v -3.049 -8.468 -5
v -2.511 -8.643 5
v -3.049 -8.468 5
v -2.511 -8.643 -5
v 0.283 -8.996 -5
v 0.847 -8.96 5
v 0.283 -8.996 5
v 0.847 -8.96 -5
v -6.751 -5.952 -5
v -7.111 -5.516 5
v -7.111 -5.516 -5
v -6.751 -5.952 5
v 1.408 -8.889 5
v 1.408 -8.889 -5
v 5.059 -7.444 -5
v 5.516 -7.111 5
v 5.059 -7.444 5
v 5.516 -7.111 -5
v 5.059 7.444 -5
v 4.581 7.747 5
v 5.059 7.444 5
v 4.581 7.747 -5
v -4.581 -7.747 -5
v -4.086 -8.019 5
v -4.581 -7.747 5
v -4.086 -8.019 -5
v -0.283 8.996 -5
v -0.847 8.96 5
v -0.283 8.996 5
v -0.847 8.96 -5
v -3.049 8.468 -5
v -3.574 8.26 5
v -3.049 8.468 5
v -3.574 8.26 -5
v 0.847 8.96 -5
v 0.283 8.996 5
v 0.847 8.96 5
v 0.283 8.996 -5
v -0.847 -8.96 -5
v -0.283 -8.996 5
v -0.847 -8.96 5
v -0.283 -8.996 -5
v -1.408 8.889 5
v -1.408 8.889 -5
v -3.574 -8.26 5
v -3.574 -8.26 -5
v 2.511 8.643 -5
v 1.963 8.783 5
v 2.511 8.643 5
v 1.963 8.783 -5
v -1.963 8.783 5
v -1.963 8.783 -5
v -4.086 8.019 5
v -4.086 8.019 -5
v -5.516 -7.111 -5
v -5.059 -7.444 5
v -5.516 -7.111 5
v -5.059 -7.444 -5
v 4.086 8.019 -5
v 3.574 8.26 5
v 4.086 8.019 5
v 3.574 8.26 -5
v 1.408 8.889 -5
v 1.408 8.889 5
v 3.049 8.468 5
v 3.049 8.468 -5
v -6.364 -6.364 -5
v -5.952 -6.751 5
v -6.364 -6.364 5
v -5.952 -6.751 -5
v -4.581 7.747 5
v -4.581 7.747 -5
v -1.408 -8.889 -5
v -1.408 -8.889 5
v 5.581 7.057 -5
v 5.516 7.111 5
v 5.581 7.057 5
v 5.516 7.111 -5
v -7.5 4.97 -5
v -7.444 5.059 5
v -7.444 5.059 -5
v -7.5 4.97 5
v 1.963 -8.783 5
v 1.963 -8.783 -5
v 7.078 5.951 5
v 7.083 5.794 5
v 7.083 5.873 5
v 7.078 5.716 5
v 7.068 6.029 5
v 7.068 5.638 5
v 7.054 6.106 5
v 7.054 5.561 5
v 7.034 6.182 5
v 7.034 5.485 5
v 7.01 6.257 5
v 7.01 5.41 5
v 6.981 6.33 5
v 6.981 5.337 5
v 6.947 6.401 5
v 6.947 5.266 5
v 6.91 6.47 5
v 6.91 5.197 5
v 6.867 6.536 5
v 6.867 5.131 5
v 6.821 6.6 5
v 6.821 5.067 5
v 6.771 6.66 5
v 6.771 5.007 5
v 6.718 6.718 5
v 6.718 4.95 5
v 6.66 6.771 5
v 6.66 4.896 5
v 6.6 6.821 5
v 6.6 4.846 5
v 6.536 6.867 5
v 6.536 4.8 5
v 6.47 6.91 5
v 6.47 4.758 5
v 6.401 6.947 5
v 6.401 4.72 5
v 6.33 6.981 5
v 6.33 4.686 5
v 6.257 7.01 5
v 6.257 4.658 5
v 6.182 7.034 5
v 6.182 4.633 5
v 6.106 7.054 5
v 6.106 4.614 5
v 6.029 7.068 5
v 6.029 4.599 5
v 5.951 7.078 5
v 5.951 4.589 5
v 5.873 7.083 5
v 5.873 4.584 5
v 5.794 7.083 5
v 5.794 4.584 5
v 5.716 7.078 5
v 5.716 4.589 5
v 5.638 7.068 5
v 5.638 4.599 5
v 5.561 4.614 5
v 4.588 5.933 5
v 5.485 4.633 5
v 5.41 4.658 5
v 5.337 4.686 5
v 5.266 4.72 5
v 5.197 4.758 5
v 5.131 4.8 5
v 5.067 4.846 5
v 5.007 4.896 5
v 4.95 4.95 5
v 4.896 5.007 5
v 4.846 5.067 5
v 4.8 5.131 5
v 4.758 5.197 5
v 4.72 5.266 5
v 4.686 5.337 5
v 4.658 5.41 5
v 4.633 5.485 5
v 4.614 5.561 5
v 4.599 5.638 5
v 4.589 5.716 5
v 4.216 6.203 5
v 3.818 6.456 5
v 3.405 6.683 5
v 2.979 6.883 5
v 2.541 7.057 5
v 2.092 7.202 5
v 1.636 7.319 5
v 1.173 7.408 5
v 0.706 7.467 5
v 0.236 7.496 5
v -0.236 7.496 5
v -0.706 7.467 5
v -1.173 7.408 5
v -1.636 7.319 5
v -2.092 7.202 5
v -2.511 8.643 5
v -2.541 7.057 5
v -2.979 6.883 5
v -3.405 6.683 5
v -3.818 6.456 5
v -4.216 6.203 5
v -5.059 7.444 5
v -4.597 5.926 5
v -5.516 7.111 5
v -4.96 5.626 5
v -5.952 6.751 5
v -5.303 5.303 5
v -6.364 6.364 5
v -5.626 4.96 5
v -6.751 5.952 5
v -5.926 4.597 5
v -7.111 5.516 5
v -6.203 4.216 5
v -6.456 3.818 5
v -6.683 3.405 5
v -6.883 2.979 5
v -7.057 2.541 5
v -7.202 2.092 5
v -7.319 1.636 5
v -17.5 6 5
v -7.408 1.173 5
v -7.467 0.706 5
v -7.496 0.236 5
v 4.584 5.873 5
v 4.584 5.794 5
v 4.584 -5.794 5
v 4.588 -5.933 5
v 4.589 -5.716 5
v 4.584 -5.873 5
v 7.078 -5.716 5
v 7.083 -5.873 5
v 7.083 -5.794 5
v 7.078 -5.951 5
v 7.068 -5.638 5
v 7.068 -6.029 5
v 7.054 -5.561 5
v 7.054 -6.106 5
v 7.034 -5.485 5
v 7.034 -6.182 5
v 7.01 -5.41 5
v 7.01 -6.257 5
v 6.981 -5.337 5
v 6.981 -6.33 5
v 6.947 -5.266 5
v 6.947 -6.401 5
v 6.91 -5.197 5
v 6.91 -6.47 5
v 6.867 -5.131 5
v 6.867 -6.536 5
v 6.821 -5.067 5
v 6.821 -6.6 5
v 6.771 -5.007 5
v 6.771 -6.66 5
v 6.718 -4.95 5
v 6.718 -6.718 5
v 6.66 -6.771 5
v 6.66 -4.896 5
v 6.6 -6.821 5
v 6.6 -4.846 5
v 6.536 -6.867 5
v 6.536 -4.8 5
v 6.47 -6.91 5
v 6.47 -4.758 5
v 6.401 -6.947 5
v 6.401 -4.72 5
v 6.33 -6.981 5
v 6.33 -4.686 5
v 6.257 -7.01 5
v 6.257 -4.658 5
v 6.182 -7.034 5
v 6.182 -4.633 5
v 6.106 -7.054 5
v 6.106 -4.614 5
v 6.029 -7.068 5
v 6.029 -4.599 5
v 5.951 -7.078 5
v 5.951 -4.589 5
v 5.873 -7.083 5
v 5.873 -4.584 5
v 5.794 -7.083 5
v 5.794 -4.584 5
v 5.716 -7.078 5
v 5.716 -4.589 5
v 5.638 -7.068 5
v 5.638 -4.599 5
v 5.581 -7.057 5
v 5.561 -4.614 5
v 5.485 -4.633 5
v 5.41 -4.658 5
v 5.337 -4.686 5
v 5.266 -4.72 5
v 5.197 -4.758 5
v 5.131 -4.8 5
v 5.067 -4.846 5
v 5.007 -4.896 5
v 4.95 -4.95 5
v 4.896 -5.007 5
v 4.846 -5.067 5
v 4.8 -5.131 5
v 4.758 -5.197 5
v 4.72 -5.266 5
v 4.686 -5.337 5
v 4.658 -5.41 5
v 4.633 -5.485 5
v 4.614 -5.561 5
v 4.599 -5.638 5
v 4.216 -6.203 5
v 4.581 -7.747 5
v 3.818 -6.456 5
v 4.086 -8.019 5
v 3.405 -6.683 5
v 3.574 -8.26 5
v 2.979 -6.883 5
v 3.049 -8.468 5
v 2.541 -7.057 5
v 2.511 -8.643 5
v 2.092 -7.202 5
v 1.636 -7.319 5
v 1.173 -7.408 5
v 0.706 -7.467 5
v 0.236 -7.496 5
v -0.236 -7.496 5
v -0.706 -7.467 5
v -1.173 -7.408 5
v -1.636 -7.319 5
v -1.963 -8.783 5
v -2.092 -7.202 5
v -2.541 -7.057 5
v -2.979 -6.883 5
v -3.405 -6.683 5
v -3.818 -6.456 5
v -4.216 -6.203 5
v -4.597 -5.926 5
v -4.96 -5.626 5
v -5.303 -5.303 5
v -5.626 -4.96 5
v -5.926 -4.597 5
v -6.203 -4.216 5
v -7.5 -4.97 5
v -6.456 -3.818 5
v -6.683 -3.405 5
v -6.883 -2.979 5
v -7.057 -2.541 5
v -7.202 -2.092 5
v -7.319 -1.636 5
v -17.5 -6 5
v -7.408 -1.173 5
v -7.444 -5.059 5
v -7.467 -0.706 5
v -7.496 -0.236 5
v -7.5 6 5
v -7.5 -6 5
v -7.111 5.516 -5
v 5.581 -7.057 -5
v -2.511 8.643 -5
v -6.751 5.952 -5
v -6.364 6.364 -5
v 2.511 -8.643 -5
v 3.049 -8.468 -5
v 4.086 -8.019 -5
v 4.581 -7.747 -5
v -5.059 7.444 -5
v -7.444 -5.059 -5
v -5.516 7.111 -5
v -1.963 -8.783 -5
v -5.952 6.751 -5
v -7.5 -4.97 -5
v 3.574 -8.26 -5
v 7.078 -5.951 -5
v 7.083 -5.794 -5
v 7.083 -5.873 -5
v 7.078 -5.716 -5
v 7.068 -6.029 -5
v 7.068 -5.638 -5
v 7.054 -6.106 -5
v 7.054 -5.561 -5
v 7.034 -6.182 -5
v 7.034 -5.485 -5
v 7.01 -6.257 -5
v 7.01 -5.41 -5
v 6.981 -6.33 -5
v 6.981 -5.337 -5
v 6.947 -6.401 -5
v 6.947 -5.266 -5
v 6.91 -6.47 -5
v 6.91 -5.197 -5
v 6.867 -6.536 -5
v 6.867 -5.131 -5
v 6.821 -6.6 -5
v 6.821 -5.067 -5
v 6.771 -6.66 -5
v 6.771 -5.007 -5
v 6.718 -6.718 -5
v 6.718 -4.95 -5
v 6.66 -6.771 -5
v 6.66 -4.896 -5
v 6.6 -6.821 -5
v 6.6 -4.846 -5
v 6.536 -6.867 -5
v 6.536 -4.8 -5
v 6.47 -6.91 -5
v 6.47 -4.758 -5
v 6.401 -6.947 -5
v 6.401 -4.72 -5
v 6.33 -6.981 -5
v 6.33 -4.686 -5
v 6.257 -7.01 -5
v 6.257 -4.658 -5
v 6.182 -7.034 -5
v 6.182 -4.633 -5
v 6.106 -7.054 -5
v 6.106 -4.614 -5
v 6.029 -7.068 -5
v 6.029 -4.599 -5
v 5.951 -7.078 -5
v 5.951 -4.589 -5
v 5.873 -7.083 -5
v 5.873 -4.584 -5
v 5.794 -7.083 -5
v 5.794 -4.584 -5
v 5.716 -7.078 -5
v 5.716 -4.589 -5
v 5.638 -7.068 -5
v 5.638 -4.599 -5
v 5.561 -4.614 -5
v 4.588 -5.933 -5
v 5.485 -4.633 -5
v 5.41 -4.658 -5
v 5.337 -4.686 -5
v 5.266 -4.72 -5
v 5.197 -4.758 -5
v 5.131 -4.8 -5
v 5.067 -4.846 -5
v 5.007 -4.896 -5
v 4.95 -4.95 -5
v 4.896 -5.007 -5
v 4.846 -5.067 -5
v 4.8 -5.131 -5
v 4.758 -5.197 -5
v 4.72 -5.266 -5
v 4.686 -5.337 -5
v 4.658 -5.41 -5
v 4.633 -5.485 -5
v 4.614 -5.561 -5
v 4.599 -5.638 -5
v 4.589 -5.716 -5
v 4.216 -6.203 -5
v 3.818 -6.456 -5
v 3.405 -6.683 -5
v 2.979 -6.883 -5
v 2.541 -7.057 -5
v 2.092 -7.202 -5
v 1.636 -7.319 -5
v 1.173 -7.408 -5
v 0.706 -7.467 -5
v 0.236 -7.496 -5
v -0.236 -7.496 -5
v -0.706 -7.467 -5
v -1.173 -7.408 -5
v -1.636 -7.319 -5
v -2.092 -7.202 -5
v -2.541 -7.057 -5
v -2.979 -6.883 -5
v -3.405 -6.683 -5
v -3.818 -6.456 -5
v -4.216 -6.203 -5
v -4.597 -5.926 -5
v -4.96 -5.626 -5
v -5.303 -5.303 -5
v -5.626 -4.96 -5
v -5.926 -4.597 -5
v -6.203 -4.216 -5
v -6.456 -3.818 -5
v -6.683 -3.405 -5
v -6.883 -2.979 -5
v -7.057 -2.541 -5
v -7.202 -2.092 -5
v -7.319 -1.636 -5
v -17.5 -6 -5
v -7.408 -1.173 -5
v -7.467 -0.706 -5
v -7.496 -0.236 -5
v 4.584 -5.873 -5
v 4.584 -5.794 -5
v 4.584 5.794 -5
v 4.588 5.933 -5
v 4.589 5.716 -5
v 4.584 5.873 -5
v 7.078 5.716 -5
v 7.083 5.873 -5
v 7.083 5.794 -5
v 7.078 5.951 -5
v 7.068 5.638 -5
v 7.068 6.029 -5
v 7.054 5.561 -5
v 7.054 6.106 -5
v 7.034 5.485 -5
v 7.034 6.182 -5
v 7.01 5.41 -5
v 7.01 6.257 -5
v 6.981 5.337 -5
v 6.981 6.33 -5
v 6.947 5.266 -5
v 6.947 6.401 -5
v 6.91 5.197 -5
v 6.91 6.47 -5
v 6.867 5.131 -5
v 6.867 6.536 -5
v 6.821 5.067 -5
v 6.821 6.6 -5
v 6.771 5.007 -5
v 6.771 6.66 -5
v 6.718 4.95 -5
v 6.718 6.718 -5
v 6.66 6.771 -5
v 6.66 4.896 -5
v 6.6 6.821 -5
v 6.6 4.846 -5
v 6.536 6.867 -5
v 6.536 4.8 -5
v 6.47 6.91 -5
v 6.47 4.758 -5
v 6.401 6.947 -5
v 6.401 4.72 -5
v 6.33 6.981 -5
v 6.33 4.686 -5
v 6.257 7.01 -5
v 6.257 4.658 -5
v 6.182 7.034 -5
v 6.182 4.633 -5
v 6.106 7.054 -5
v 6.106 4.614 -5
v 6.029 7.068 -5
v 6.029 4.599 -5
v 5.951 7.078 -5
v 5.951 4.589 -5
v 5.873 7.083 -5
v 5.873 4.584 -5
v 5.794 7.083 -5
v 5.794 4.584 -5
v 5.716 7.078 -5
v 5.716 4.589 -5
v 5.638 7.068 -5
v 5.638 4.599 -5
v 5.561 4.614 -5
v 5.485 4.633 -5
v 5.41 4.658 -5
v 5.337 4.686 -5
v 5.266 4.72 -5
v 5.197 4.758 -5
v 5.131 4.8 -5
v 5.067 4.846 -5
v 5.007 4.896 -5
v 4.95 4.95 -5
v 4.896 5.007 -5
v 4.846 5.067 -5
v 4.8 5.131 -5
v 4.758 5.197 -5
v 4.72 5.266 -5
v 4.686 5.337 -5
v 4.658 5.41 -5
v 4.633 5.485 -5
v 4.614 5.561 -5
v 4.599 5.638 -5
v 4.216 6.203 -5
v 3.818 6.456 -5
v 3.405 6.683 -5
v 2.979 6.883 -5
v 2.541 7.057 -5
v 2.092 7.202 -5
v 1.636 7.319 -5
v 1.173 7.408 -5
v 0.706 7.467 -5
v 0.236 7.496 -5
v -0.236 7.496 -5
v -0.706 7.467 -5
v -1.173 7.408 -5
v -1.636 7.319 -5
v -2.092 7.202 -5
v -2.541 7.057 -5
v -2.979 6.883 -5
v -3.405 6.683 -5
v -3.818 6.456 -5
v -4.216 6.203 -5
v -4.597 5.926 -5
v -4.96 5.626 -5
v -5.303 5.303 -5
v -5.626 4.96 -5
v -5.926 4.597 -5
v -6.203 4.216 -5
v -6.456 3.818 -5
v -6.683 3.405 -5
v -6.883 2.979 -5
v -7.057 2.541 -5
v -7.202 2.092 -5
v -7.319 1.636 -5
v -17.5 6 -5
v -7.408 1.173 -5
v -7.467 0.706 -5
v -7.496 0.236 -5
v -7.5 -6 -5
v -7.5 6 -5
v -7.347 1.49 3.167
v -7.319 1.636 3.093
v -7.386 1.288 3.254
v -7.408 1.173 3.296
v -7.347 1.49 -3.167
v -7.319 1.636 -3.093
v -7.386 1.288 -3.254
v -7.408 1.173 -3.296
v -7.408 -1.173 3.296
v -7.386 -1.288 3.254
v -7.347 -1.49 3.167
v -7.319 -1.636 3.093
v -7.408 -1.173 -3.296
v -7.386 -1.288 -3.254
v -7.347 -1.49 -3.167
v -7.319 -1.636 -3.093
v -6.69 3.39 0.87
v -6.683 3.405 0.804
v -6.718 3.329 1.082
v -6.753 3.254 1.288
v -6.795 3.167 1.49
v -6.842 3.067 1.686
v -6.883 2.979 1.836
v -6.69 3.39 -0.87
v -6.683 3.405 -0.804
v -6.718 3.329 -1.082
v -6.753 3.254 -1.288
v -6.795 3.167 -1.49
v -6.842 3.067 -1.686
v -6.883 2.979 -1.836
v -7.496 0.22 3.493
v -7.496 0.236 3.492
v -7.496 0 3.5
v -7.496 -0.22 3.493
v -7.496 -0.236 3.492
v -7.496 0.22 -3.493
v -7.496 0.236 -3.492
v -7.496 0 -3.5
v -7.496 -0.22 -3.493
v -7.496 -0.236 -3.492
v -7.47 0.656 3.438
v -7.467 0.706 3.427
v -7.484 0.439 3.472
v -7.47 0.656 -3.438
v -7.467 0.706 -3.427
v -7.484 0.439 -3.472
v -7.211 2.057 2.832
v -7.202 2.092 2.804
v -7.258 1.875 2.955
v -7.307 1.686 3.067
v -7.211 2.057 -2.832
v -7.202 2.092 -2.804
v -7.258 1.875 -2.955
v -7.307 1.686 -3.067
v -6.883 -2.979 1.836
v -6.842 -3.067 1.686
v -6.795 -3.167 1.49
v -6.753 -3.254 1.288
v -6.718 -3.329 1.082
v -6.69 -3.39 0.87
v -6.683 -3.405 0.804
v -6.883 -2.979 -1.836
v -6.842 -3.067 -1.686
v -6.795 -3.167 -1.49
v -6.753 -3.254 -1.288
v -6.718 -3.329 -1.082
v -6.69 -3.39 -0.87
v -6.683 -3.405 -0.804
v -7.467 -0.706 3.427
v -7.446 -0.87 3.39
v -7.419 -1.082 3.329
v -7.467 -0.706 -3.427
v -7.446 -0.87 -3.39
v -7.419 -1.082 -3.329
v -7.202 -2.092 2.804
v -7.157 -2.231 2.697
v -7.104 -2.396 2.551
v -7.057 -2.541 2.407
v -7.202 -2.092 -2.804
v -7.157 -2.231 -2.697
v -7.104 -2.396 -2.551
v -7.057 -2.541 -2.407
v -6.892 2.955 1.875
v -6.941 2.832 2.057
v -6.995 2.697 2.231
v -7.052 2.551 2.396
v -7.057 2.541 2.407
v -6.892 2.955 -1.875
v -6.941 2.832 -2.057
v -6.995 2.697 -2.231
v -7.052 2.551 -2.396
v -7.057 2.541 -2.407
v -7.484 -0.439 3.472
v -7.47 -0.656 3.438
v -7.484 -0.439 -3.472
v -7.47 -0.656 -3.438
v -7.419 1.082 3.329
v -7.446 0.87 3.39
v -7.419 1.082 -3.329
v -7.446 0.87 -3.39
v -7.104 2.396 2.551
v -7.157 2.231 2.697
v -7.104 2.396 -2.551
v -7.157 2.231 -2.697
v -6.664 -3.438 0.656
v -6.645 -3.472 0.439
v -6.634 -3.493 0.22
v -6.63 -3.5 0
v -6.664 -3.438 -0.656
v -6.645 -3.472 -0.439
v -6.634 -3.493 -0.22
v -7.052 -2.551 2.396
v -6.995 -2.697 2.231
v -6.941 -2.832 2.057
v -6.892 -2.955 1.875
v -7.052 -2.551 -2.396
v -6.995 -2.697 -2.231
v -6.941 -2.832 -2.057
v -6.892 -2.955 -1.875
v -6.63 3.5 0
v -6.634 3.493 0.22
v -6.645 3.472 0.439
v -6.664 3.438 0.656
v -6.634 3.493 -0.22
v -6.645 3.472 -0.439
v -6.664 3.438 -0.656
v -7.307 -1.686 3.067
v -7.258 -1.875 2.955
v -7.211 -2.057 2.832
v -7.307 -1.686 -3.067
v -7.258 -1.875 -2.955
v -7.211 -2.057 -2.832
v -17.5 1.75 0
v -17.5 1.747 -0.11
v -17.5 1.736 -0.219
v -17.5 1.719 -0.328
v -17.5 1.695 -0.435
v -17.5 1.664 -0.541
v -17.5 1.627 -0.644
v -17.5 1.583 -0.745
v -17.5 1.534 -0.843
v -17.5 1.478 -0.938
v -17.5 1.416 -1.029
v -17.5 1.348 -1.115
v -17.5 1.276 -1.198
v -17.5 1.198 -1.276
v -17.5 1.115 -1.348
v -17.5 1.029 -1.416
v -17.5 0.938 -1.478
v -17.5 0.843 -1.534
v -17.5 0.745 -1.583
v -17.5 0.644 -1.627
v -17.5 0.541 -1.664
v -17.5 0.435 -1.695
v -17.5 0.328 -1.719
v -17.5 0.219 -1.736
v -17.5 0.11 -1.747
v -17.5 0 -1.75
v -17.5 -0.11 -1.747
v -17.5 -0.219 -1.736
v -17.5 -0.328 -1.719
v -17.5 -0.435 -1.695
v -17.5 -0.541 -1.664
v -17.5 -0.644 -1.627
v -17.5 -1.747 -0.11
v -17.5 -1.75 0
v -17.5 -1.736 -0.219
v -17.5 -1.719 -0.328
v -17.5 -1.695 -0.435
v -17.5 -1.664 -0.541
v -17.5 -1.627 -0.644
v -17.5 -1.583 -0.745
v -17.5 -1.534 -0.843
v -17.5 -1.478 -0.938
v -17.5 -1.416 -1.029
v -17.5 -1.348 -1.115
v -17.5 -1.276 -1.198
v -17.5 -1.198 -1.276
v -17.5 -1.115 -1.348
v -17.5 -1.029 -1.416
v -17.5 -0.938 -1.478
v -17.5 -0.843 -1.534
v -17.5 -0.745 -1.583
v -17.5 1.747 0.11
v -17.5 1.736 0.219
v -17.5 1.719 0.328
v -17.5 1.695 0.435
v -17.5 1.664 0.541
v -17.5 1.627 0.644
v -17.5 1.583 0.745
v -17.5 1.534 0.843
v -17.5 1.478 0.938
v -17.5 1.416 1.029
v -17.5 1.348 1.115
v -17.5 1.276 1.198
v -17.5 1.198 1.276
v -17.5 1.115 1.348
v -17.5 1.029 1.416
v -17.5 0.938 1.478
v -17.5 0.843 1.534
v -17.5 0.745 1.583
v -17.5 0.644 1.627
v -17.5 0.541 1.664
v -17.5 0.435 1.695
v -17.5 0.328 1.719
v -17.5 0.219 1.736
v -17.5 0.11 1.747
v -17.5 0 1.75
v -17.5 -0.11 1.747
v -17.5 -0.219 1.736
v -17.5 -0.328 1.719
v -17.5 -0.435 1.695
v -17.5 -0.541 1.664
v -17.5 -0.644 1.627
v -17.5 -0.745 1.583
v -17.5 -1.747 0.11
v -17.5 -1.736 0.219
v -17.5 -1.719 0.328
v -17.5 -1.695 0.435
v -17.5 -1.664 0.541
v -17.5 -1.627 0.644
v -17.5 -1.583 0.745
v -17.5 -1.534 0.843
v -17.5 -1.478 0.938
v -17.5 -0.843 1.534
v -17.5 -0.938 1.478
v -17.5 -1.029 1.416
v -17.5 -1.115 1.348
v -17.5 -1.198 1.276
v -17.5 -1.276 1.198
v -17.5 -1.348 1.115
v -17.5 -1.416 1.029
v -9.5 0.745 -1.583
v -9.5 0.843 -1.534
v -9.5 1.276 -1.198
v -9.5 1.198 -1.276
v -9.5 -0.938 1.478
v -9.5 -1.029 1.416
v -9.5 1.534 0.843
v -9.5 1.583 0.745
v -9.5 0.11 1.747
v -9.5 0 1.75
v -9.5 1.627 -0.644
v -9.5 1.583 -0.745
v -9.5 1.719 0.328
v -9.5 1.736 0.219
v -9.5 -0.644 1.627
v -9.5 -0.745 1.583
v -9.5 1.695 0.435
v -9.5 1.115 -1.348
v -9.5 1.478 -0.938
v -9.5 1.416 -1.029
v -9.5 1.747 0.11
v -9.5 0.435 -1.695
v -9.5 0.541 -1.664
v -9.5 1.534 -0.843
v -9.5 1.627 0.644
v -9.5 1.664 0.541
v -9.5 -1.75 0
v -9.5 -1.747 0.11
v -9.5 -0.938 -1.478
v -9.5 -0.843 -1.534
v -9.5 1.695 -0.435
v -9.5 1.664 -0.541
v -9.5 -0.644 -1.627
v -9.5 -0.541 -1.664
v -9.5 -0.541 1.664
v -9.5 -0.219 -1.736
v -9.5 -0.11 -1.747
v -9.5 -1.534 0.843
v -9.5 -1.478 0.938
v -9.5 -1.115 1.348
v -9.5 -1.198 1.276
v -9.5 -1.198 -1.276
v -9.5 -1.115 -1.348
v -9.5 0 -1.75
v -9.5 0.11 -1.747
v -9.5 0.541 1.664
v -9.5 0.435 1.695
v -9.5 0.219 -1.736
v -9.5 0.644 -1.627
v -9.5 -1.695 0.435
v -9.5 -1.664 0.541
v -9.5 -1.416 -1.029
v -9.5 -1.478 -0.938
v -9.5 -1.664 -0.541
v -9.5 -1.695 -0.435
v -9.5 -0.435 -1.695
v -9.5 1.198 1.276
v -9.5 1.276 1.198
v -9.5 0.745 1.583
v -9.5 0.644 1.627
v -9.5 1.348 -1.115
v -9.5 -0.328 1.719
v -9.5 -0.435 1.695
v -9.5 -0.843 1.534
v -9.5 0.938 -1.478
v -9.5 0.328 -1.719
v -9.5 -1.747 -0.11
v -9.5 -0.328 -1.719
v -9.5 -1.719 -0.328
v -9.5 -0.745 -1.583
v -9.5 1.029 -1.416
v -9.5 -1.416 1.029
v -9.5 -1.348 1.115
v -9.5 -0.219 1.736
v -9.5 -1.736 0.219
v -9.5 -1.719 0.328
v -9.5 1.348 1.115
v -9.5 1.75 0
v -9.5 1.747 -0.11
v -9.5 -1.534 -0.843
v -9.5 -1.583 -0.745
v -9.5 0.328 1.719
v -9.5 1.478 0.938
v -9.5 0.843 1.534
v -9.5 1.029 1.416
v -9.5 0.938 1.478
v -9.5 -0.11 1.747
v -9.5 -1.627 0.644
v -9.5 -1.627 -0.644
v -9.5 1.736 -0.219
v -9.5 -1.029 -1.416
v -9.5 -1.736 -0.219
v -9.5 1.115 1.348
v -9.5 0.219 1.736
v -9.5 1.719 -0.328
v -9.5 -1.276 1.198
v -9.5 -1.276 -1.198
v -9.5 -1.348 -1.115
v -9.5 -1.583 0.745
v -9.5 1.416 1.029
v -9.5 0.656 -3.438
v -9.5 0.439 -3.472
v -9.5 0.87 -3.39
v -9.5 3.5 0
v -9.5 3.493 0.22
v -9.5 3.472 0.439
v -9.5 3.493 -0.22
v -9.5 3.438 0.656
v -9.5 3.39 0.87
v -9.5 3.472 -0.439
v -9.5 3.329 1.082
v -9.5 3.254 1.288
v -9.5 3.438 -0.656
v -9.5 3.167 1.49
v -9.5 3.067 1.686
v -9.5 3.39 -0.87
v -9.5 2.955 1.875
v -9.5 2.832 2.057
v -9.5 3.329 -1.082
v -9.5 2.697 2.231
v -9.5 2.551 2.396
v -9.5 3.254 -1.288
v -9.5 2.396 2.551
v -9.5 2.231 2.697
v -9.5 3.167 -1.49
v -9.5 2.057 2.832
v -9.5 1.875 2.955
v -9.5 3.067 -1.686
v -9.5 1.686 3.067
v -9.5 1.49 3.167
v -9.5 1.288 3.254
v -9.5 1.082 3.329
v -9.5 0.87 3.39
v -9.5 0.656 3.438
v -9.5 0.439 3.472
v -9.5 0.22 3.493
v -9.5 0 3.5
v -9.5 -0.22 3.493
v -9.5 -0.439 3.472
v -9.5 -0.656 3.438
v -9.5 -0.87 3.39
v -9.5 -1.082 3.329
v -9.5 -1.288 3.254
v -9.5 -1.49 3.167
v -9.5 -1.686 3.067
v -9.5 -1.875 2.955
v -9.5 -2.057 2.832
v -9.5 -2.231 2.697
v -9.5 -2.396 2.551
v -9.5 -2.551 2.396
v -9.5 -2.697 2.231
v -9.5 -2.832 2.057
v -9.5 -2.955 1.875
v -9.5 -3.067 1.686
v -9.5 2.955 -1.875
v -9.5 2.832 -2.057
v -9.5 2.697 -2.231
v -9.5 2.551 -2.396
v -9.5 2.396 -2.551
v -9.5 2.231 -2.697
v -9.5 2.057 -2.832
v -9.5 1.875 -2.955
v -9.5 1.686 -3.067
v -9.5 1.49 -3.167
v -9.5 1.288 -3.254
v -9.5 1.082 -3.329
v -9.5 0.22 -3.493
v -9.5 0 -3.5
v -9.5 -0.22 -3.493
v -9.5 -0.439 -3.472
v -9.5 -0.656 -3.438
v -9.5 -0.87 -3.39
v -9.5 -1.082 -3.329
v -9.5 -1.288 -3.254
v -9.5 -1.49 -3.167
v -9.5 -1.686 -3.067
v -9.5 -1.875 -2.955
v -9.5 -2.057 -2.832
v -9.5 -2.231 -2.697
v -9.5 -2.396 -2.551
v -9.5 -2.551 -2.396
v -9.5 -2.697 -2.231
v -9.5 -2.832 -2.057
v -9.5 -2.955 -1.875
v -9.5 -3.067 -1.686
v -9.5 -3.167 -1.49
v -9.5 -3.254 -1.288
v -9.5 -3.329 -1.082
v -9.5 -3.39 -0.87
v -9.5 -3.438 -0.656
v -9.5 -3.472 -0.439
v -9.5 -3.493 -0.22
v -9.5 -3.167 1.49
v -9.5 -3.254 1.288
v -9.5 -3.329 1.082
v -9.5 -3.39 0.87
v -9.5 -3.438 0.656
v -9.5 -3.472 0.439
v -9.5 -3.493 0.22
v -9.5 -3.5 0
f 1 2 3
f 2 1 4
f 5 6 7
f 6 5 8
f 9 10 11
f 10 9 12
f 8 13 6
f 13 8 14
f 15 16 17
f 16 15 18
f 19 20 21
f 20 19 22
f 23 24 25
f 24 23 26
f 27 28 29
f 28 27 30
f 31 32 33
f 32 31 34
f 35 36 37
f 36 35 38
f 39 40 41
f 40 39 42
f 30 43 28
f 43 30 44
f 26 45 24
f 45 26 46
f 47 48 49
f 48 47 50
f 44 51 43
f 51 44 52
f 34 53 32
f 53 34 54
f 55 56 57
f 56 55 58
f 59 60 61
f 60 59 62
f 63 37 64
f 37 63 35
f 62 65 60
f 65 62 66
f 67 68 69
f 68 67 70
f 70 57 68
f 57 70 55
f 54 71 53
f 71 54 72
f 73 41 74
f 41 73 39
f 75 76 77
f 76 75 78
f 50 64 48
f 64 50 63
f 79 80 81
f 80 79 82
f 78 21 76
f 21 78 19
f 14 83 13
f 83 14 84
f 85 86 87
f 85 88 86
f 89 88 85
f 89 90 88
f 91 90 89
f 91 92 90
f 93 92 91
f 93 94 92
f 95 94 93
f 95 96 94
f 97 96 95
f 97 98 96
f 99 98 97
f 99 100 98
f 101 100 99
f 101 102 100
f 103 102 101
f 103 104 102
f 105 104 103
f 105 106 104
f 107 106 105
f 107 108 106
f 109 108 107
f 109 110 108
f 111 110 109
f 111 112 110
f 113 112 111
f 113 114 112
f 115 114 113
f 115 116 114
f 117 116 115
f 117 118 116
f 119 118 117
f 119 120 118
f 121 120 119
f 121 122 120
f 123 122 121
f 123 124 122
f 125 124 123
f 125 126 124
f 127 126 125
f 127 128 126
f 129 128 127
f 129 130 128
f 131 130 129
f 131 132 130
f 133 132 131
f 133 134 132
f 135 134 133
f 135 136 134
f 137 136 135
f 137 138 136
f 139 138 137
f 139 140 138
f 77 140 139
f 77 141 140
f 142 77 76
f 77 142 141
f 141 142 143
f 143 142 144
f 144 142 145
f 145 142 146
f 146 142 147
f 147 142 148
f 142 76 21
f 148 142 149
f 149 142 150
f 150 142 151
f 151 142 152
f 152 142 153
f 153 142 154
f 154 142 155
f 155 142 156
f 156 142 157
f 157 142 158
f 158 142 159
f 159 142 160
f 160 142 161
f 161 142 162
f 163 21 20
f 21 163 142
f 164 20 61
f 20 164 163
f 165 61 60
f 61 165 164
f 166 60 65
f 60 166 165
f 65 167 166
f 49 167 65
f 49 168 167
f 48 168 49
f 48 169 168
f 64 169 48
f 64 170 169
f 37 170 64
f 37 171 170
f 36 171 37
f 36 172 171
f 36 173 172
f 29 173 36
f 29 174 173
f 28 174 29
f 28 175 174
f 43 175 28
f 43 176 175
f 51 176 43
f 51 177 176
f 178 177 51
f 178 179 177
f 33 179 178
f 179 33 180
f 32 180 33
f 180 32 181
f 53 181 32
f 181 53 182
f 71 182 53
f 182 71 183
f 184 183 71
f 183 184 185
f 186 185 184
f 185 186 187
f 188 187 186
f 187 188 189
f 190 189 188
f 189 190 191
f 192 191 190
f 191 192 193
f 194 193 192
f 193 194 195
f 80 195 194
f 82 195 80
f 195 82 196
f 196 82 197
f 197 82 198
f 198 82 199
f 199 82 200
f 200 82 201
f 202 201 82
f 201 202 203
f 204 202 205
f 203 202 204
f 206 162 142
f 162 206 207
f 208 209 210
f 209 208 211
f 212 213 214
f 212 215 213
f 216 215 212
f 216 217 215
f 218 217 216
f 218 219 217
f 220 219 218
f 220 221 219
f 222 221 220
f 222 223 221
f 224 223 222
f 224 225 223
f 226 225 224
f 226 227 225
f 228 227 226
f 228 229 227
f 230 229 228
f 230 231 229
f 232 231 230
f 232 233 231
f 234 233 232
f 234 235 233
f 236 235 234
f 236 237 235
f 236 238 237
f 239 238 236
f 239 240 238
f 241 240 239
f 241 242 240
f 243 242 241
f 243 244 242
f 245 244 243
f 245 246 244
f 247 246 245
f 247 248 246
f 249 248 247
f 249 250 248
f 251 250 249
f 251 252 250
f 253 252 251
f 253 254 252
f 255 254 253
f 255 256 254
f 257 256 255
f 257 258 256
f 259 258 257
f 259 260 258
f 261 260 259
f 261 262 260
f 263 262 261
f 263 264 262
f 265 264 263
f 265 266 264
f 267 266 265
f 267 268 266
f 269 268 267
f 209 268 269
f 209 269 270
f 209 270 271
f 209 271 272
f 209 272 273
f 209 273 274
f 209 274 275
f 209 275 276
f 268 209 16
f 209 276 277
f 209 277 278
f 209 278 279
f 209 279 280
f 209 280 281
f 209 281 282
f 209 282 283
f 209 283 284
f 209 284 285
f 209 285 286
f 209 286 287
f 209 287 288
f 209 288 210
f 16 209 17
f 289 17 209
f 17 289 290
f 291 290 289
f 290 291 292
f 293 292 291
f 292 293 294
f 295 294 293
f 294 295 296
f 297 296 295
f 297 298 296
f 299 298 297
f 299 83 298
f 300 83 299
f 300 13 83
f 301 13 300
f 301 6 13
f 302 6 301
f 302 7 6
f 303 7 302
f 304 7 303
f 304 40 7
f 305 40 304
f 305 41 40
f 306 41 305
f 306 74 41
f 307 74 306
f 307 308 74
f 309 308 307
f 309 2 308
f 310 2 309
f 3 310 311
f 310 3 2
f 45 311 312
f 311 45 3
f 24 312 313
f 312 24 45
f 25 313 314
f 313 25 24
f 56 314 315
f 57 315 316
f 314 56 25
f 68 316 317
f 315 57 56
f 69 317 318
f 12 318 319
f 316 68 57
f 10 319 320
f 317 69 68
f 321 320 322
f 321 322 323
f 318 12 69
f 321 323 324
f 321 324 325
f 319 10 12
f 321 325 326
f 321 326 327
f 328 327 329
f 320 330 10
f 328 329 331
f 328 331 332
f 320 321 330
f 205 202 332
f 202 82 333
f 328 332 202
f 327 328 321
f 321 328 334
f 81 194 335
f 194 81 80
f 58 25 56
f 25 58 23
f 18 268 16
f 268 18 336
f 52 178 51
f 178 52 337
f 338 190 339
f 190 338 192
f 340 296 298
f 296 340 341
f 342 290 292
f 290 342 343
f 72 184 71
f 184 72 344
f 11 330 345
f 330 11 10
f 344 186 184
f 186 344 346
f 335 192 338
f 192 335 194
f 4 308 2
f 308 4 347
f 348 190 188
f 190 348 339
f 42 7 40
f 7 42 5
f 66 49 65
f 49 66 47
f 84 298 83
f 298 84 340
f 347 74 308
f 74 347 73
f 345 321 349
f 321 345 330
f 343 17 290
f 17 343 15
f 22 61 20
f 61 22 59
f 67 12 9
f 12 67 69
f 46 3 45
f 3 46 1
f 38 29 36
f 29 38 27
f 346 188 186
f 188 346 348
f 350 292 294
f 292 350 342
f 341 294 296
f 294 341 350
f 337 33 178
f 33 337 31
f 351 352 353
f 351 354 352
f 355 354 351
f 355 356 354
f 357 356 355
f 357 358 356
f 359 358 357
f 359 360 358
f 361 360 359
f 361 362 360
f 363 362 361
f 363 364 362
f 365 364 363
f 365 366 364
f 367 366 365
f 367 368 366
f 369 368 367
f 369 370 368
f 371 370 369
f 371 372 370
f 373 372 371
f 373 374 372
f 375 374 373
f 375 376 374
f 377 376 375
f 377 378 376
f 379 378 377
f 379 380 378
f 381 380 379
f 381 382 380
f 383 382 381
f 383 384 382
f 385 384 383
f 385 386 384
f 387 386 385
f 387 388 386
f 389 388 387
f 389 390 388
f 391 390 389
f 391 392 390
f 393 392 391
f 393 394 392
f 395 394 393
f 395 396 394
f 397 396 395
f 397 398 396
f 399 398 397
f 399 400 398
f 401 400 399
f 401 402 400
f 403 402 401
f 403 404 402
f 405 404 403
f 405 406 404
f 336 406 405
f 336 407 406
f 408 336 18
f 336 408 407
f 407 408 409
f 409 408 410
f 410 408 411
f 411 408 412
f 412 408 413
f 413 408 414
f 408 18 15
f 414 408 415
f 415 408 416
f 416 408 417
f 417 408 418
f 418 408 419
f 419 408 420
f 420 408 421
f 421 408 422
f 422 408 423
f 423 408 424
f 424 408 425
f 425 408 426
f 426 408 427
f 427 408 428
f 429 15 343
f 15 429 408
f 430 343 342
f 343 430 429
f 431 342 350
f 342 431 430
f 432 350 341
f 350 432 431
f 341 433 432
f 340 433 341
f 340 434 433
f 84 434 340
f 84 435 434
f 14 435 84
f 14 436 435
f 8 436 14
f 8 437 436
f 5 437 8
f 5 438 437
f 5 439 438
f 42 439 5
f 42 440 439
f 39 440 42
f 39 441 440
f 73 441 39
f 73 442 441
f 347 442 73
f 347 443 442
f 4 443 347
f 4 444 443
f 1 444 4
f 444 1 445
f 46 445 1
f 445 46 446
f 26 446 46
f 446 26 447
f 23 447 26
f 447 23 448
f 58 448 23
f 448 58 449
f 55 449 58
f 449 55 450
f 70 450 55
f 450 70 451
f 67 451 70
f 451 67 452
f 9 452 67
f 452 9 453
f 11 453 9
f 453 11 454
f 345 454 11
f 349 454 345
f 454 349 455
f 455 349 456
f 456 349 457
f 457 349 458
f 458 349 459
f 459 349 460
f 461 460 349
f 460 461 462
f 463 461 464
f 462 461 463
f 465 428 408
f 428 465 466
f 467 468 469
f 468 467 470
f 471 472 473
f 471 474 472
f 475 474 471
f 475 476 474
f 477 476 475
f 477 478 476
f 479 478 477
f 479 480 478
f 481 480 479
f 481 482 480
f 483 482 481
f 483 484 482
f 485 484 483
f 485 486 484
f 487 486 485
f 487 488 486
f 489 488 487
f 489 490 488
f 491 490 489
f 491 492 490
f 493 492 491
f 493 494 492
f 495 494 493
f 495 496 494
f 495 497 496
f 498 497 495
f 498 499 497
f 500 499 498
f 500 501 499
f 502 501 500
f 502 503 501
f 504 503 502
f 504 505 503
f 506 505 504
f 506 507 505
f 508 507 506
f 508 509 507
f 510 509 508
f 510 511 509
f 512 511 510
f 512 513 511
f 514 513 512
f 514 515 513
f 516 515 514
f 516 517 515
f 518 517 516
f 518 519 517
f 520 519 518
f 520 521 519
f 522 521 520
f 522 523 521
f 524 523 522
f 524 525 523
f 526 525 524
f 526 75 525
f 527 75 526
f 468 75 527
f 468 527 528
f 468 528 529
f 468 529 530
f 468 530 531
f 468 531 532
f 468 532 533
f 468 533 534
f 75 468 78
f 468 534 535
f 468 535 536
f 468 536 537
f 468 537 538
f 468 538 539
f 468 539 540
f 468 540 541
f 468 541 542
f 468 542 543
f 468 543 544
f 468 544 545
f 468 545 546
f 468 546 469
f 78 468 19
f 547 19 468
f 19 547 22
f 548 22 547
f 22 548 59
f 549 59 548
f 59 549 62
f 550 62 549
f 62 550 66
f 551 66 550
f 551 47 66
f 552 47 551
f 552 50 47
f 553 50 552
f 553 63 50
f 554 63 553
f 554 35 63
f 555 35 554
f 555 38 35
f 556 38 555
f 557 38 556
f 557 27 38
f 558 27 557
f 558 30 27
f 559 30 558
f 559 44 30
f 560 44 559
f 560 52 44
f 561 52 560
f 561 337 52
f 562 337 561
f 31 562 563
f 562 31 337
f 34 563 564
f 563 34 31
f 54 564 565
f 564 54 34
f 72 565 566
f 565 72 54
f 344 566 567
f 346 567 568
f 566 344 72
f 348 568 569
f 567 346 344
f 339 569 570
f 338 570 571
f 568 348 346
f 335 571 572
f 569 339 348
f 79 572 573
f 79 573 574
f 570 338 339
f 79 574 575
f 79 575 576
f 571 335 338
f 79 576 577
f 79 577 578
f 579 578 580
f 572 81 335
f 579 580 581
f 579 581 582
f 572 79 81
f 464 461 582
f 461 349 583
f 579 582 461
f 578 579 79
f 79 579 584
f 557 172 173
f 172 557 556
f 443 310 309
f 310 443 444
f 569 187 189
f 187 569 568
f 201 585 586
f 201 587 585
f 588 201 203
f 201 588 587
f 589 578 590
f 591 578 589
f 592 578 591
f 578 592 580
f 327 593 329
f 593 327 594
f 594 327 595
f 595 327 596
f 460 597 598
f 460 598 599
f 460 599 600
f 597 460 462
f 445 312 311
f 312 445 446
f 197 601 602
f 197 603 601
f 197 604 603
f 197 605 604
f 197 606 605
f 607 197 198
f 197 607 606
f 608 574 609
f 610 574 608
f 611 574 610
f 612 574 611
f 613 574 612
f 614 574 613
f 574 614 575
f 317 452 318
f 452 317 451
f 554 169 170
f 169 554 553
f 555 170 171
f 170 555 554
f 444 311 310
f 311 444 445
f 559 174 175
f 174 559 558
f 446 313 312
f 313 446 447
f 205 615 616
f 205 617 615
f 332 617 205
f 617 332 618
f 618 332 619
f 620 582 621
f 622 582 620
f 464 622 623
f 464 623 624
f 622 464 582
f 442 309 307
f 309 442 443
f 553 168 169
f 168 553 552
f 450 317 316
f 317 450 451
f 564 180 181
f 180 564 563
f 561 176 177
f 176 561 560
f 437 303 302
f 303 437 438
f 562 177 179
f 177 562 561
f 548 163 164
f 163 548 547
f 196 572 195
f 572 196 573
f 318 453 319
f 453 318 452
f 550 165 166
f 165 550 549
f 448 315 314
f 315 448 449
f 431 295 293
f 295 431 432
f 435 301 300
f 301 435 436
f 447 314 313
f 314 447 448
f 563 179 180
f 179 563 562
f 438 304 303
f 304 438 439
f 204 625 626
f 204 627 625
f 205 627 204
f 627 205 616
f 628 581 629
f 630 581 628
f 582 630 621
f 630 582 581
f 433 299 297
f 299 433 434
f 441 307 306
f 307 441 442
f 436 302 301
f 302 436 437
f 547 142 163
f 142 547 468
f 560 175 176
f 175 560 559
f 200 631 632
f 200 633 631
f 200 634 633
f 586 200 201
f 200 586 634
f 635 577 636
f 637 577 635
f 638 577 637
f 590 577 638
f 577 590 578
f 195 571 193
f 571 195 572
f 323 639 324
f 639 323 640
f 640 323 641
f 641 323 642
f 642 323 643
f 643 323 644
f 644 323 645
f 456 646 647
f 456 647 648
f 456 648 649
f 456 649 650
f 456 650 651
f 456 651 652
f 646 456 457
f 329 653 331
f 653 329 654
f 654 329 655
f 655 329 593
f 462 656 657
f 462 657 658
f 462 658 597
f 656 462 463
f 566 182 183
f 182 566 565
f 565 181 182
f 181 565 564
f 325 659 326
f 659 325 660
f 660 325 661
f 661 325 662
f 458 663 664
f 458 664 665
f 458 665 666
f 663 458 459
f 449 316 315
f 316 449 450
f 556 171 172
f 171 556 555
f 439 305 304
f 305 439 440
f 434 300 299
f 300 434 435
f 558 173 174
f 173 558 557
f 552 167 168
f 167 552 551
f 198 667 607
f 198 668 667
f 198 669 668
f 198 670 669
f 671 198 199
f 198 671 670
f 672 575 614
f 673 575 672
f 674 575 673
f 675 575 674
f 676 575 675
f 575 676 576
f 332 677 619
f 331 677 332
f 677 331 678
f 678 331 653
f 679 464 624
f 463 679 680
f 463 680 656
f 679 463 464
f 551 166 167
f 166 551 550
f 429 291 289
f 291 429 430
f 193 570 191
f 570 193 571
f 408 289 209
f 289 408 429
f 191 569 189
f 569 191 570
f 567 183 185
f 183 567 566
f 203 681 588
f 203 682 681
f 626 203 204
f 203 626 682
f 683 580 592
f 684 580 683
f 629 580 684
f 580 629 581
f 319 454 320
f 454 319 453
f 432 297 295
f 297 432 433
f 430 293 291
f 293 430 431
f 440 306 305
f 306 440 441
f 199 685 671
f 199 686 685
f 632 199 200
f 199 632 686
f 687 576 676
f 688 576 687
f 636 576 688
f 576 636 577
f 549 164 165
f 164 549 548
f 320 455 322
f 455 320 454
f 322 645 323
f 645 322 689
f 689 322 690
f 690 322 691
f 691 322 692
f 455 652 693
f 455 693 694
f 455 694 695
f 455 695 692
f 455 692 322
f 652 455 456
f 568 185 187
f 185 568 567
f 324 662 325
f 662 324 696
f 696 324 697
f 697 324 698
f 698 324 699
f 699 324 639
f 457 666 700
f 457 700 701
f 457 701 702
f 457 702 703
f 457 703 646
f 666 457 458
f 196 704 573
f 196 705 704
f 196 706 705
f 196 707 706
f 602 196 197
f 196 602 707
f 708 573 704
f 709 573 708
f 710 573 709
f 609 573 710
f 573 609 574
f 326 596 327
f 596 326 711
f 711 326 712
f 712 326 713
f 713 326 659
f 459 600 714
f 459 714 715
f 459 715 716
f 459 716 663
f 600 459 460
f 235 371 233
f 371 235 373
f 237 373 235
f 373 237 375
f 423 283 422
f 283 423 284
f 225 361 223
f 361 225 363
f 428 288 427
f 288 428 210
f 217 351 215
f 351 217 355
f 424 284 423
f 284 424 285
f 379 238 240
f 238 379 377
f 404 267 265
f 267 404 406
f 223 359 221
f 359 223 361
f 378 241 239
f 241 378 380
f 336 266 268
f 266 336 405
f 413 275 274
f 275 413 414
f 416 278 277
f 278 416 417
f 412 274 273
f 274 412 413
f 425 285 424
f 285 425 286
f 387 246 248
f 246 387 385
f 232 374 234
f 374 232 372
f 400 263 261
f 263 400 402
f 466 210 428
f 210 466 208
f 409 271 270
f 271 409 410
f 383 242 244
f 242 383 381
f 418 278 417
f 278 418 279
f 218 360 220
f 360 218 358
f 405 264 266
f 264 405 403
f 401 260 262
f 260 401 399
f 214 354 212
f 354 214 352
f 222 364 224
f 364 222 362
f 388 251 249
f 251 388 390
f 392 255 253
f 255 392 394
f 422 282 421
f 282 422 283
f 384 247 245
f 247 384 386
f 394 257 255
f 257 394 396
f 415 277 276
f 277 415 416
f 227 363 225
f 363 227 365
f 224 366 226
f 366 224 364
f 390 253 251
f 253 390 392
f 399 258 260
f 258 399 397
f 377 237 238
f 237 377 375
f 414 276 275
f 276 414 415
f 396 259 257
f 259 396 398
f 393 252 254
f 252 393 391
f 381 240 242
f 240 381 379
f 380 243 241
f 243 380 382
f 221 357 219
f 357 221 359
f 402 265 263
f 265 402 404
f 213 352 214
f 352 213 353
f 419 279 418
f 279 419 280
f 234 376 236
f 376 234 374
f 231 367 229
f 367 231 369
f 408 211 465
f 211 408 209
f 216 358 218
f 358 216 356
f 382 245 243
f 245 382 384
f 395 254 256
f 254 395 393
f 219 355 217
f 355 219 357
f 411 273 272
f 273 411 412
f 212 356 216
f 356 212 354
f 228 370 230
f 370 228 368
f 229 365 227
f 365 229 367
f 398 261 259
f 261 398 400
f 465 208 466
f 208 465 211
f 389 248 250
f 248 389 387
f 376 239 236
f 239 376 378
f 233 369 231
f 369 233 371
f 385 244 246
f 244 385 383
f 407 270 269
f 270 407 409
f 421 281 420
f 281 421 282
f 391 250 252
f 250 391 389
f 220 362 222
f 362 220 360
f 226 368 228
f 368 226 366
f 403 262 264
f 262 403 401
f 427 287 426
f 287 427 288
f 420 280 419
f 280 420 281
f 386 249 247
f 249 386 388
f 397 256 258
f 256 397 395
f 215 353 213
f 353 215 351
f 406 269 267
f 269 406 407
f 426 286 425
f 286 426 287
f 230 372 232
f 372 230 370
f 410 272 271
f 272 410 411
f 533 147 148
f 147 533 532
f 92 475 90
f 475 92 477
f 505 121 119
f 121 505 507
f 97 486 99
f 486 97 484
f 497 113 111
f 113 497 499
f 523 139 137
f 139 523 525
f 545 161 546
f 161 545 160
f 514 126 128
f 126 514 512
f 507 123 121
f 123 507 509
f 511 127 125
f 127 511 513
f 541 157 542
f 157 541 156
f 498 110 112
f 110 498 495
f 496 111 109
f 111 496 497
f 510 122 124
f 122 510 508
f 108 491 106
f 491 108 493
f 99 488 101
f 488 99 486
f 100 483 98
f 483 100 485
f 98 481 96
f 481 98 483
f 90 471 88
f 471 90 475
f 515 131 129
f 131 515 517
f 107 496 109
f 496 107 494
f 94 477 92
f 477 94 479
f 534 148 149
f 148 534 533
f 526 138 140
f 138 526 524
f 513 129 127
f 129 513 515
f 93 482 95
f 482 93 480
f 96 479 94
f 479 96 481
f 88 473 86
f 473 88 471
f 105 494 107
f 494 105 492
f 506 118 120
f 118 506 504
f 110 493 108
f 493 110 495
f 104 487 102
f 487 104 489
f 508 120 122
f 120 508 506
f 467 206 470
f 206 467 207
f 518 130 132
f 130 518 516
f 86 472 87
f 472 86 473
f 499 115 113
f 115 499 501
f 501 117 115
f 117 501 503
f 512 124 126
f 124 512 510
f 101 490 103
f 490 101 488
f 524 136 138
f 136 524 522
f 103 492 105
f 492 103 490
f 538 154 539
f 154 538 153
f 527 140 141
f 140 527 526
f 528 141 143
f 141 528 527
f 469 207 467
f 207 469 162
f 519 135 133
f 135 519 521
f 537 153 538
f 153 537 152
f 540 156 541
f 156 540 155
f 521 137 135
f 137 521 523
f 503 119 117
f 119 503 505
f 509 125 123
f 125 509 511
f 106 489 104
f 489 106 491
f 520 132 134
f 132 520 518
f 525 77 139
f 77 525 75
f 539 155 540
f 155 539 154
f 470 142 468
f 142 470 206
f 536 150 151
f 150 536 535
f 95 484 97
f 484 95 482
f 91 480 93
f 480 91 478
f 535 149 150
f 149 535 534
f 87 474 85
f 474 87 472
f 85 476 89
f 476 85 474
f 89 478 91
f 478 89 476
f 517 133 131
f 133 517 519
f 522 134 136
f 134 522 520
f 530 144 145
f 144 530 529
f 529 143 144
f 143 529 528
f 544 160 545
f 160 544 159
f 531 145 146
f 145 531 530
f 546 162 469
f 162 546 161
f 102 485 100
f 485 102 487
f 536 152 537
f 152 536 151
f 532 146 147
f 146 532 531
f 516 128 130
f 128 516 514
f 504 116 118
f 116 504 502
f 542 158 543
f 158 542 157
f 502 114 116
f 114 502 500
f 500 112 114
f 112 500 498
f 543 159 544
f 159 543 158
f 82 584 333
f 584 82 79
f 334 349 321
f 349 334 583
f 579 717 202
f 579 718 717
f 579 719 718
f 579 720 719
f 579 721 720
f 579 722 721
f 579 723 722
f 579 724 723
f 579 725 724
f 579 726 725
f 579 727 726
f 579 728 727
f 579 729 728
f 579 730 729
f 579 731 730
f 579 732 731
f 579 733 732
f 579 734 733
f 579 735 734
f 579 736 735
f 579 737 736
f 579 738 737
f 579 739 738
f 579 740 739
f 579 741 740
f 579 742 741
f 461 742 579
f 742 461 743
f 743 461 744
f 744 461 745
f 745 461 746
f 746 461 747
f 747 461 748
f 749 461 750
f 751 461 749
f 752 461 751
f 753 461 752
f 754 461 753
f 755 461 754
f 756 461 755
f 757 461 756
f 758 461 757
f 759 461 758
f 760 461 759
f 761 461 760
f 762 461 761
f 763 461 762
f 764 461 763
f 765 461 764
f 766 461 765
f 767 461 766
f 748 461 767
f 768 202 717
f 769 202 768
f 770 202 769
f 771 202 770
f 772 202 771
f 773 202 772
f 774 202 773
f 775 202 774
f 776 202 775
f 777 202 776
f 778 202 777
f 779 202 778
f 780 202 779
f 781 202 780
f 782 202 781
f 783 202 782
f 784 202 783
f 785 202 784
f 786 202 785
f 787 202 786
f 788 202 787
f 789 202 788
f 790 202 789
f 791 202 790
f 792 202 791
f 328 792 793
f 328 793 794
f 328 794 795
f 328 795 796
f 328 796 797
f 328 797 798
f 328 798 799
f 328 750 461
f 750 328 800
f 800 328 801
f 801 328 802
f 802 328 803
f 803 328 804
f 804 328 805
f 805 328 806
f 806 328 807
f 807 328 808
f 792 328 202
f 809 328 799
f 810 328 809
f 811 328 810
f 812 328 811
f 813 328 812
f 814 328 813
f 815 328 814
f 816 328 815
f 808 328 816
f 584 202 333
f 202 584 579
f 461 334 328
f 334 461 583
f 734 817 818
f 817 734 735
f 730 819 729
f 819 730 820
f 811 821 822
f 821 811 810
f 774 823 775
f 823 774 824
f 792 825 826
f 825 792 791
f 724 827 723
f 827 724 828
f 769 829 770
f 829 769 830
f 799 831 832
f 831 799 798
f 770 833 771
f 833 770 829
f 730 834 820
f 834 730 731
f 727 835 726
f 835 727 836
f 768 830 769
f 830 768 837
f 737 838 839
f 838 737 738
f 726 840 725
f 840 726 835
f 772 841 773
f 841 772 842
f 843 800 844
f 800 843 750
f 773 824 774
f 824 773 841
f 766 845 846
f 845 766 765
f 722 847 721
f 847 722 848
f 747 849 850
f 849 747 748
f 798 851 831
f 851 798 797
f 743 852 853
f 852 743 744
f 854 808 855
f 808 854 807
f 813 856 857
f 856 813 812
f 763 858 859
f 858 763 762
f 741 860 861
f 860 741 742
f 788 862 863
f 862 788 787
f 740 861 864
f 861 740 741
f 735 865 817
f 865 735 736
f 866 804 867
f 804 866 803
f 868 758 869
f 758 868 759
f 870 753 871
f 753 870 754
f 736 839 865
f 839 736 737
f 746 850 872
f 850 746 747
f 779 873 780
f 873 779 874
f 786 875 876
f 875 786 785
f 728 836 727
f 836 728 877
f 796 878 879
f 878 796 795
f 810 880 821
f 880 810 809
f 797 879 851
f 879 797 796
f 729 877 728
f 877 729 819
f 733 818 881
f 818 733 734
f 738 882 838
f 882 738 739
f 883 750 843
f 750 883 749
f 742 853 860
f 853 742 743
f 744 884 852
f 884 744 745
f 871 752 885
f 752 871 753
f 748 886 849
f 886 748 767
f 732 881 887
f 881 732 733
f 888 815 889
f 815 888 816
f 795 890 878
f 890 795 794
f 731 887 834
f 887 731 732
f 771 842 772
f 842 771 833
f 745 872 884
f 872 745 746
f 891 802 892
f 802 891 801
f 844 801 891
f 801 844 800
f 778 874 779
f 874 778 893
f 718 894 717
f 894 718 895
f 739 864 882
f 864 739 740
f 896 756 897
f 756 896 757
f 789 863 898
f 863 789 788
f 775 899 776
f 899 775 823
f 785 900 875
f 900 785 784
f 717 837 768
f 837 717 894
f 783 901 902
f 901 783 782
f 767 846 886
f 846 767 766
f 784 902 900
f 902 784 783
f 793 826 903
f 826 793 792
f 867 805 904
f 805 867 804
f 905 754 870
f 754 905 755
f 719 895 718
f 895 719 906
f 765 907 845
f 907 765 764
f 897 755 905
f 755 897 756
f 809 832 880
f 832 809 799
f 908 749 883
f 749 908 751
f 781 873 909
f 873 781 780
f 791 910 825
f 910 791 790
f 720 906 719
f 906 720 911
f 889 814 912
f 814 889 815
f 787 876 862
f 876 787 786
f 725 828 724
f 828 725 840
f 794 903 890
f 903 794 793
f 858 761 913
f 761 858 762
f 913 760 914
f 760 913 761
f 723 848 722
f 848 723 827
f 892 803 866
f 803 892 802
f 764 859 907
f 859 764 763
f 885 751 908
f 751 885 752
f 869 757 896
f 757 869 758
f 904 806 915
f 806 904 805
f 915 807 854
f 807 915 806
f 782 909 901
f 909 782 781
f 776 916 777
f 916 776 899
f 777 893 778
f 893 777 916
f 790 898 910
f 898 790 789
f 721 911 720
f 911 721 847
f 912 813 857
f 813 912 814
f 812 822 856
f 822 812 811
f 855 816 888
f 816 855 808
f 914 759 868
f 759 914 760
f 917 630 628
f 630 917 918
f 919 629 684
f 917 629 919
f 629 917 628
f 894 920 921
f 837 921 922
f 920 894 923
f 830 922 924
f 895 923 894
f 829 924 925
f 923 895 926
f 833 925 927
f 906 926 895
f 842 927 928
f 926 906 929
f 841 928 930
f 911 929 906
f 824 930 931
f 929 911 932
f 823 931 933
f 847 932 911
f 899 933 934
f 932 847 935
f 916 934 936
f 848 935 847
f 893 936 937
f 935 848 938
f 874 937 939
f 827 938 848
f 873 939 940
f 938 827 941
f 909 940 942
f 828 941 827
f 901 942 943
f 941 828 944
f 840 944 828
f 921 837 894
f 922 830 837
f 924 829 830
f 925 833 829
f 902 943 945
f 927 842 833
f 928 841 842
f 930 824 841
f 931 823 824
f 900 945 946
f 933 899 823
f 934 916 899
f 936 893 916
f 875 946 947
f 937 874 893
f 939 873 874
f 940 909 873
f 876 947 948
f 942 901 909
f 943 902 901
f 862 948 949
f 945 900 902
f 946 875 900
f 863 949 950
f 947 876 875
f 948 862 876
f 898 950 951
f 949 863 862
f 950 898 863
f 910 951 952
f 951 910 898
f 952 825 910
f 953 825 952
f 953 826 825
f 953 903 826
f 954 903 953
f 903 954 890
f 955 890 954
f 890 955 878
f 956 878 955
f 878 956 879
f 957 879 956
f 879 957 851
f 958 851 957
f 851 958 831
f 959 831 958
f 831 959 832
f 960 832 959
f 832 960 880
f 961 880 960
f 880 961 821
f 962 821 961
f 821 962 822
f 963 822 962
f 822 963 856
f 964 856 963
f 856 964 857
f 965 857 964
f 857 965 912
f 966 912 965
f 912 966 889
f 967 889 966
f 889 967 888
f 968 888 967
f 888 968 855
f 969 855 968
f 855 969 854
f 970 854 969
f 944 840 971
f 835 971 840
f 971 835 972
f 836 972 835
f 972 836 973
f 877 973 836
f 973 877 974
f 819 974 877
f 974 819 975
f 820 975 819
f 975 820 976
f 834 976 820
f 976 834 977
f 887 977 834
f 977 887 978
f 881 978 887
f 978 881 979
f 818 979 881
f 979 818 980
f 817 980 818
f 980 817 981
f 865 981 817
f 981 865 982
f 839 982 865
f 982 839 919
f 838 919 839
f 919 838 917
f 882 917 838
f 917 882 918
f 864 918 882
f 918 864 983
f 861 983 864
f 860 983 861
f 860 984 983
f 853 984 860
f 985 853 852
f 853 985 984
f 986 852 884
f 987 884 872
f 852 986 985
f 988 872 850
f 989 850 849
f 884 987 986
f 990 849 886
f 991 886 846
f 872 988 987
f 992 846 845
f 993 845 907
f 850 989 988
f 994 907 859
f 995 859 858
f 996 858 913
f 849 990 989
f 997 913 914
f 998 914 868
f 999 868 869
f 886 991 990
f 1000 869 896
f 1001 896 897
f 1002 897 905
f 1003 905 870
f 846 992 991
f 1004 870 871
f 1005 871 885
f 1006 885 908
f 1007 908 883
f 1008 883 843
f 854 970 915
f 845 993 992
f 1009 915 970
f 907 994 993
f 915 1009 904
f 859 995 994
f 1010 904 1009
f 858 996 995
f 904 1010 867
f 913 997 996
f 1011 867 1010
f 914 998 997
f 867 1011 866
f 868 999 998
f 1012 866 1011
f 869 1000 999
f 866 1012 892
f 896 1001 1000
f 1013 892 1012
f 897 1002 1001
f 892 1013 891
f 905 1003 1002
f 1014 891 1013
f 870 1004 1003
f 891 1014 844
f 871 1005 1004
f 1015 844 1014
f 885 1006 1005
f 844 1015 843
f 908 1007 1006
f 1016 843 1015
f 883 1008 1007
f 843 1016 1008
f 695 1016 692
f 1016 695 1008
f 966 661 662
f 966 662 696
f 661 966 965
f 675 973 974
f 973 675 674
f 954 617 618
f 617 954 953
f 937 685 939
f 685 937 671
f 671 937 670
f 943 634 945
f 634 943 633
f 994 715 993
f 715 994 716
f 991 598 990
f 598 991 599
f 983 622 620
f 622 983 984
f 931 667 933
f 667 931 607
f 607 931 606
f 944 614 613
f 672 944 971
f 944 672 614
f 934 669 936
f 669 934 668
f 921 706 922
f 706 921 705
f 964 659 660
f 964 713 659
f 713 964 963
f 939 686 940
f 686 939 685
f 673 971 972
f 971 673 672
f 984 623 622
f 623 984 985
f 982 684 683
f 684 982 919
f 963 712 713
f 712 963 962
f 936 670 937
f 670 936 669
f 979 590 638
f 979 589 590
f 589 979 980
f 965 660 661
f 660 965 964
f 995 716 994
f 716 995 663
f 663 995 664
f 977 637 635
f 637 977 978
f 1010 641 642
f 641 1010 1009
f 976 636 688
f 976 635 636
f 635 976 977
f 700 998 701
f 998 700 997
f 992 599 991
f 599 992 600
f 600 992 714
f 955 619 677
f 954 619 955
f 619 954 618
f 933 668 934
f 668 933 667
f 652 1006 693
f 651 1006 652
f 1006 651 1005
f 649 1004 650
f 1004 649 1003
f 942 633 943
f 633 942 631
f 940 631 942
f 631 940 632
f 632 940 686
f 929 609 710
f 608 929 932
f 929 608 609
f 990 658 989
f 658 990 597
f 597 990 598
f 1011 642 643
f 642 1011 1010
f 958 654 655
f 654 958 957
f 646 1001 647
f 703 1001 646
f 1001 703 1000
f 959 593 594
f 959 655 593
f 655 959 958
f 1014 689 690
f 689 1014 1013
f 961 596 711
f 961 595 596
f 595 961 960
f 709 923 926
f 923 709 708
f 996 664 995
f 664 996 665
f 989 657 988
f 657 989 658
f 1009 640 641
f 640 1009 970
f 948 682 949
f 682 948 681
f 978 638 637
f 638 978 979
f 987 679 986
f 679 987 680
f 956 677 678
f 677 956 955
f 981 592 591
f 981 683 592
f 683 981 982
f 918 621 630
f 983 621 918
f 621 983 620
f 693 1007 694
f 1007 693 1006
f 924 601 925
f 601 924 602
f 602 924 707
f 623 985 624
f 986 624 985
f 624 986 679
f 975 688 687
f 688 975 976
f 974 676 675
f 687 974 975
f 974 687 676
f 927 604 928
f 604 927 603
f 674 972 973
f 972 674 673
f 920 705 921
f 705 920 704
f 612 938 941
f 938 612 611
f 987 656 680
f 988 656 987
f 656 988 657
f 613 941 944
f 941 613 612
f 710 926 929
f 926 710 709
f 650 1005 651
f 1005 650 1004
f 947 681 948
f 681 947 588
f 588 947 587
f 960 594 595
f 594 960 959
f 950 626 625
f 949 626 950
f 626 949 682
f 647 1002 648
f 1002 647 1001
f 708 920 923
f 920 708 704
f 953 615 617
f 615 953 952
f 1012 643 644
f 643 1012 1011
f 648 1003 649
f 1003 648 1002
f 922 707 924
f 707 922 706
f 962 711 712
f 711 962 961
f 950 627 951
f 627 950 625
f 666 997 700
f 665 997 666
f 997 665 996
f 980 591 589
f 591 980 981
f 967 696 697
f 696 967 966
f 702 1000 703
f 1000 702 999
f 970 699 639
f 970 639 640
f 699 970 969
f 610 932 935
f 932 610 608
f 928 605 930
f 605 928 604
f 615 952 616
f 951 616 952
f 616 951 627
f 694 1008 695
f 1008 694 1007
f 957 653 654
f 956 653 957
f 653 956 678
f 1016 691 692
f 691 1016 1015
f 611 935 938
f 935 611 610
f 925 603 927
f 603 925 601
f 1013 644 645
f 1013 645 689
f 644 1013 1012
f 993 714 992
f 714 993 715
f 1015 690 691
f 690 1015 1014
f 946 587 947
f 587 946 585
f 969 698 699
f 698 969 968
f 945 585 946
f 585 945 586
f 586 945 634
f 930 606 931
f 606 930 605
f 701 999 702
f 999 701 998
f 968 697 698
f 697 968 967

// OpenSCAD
id = 15;          // inner diameter of ring
od = 18;          // outer diameter of ring
height = 10;      // height of ring
gap = 90;         // ring opening in degrees
ends=1;           // 0 no ends, 1 round ends, 2 clamp ends
hd=3.5;           // mount hole diameter
cd=7;             // countersink diameter
cdepth=2;         // coutersink depth
blobsize=1;       // size of rounded ends, if ends==1
sw=12;            // mounting block width
sdepth=10;        // support depth
nholes=1;         // number of support holes.
block_holes=[0];   // block some holes e.g. [2,3]
sh=10;            // mounting block height. NB total height is nholes x height.
support_loc=0;    // 0 = mounting block is centered, >0 centred on hole number
support_rot=0;    // support angle / clamp angle.
flat_bottom=false; //remove all points below the bottom of the ring for ease of printing
clamp_width=5;   // width of clamp ends
clamp_depth=10;   // depth of clamp ends
clamp_height=10;  // height of clamp ends
clamp_hole=3;     // diameter of clap screw hole
clamp_holew=1;    // clamp hole width

// internal constants
$fn=100;
g=1/(nholes+1);
fracs=[for (i=[g:g:(1-g)]) each i];
sh2=sh+cd;

module main() {
    difference() {
        union(){
            // the clip
            clip();
            // mounting block
            if (nholes>0) {
            rotate([support_rot,0,0]) {
                if (support_loc==0) { //center    
                    translate([0,0,-(sh/2)*(nholes-1)]){
                        support_block();
                    }
                } else {
                    translate([0,0,-sh*(support_loc-1)]){
                        support_block();
                    }
                }
            }
        }
        }
        if(nholes>0){
        // holes go through clip and mounting block
        rotate([support_rot,0,0]) {
            if (support_loc==0) { //center
                    translate([0,0,-(sh/2)*(nholes-1)]){
                        holes();
                    }
            } else {
                translate([0,0,-sh*(support_loc-1)]){
                    holes();
                }
            }
        }
    }
        //flat bottom
        if (flat_bottom) {
            translate([0,0,-(od+sh)-height/2]) {
                cube(2*(od+sh),center=true);
            }
        }
    }
} //main


module end_blobs(h,d,angle,od,center=false) {
translate([od,0,0]){
    cylinder(h=h,d=d,center=center);
}
rotate([0,0,angle]) {
    translate([od,0,0]){
        cylinder(h=h,d=d,center=center);
    }
}
} //end_blobs

module end_clamps(){
    translate([id/2+clamp_depth/2+(od-id)/4,-clamp_width/2,0]){
        difference(){
            cube([clamp_depth,clamp_width,clamp_height],center=true);
            translate([-clamp_holew/2,0,0]) {
                rotate([90,0,0]){
                    cylinder(d=clamp_hole,h=clamp_width+2,center=true);
                }
            }
            translate([clamp_holew/2,0,0]) {
                rotate([90,0,0]){
                    cylinder(d=clamp_hole,h=clamp_width+2,center=true);
                }
            }
            cube([clamp_holew,clamp_width+2,clamp_hole],center=true);
        }
    }
    
    rotate([0,0,gap]) {
    translate([id/2+clamp_depth/2+(od-id)/4,clamp_width/2,0]){
        difference(){
            cube([clamp_depth,clamp_width,clamp_height],center=true);
            translate([-clamp_holew/2,0,0]) {
                rotate([90,0,0]){
                    cylinder(d=clamp_hole,h=clamp_width+2,center=true);
                }
            }
            translate([clamp_holew/2,0,0]) {
                rotate([90,0,0]){
                    cylinder(d=clamp_hole,h=clamp_width+2,center=true);
                }
            }
            cube([clamp_holew,clamp_width+2,clamp_hole],center=true);
        }
    }
}
}

module wedge(h,d,angle,center=false) {
intersection(){
    cylinder(h=h,d=d,center=center);
    x = (sqrt(2*(d^2))/2)+1;
    y = 0;
    xr = x*cos(angle)-y*sin(angle);
    yr = x*sin(angle)+y*cos(angle);

    linear_extrude(h*2,center=center){
        if (angle<=90){
            polygon([[x,0],[xr,yr],[0,0]]);
        } else if (angle<=180) {
            polygon([[x,0],[0,x],[xr,yr],[0,0]]);
        } else if (angle<=270) {
            polygon([[x,0],[0,x],[-x,0],[xr,yr],[0,0]]);
        } else {
            polygon([[x,0],[0,x],[-x,0],[0,-x],[xr,yr],[0,0]]);
        }
    }
}
} //wedge

module support_block() {   
for (k = [g:g:(1-g)]) { 
    offset=sh*((k-g)/g);
    translate([-(sdepth/2)-id/2,0,offset]){
        cube([sdepth,sw,sh],center=true);
    }
}
} //support_block

module clip(){
    rotate([0,0,-gap/2]){
        difference() {
            cylinder(h=height,d=od,center=true);
            cylinder(h=height*2,d=id,center=true);
            wedge(h=height*2,d=od+1,center=true,angle=gap);
        }
        if (ends==1) {
            end_blobs(h=height,d=((od-id)/2)+blobsize,angle=gap,od=(id+(od-id)/2)/2,center=true);
        }
        if (ends==2) {
            end_clamps();
        }
    }

} //clip

module holes(){
  
for (f = [1:nholes]) {
    k=fracs[f-1];
    if (len(search(f,block_holes))==0) {
        offset=sh*((k-g)/g);
        translate([-(sdepth/2)-id/2,0,offset]){
        // mount holes
        rotate([0,90,0]){
            cylinder(h=2*sdepth,d=hd,center=true);
        }
        // countersink
        translate([sdepth/2-cdepth,0,0]){
        rotate([0,90,0]){
            cylinder(h=2*sdepth,d=cd);
        }
    }
}
}
}
}

main();
